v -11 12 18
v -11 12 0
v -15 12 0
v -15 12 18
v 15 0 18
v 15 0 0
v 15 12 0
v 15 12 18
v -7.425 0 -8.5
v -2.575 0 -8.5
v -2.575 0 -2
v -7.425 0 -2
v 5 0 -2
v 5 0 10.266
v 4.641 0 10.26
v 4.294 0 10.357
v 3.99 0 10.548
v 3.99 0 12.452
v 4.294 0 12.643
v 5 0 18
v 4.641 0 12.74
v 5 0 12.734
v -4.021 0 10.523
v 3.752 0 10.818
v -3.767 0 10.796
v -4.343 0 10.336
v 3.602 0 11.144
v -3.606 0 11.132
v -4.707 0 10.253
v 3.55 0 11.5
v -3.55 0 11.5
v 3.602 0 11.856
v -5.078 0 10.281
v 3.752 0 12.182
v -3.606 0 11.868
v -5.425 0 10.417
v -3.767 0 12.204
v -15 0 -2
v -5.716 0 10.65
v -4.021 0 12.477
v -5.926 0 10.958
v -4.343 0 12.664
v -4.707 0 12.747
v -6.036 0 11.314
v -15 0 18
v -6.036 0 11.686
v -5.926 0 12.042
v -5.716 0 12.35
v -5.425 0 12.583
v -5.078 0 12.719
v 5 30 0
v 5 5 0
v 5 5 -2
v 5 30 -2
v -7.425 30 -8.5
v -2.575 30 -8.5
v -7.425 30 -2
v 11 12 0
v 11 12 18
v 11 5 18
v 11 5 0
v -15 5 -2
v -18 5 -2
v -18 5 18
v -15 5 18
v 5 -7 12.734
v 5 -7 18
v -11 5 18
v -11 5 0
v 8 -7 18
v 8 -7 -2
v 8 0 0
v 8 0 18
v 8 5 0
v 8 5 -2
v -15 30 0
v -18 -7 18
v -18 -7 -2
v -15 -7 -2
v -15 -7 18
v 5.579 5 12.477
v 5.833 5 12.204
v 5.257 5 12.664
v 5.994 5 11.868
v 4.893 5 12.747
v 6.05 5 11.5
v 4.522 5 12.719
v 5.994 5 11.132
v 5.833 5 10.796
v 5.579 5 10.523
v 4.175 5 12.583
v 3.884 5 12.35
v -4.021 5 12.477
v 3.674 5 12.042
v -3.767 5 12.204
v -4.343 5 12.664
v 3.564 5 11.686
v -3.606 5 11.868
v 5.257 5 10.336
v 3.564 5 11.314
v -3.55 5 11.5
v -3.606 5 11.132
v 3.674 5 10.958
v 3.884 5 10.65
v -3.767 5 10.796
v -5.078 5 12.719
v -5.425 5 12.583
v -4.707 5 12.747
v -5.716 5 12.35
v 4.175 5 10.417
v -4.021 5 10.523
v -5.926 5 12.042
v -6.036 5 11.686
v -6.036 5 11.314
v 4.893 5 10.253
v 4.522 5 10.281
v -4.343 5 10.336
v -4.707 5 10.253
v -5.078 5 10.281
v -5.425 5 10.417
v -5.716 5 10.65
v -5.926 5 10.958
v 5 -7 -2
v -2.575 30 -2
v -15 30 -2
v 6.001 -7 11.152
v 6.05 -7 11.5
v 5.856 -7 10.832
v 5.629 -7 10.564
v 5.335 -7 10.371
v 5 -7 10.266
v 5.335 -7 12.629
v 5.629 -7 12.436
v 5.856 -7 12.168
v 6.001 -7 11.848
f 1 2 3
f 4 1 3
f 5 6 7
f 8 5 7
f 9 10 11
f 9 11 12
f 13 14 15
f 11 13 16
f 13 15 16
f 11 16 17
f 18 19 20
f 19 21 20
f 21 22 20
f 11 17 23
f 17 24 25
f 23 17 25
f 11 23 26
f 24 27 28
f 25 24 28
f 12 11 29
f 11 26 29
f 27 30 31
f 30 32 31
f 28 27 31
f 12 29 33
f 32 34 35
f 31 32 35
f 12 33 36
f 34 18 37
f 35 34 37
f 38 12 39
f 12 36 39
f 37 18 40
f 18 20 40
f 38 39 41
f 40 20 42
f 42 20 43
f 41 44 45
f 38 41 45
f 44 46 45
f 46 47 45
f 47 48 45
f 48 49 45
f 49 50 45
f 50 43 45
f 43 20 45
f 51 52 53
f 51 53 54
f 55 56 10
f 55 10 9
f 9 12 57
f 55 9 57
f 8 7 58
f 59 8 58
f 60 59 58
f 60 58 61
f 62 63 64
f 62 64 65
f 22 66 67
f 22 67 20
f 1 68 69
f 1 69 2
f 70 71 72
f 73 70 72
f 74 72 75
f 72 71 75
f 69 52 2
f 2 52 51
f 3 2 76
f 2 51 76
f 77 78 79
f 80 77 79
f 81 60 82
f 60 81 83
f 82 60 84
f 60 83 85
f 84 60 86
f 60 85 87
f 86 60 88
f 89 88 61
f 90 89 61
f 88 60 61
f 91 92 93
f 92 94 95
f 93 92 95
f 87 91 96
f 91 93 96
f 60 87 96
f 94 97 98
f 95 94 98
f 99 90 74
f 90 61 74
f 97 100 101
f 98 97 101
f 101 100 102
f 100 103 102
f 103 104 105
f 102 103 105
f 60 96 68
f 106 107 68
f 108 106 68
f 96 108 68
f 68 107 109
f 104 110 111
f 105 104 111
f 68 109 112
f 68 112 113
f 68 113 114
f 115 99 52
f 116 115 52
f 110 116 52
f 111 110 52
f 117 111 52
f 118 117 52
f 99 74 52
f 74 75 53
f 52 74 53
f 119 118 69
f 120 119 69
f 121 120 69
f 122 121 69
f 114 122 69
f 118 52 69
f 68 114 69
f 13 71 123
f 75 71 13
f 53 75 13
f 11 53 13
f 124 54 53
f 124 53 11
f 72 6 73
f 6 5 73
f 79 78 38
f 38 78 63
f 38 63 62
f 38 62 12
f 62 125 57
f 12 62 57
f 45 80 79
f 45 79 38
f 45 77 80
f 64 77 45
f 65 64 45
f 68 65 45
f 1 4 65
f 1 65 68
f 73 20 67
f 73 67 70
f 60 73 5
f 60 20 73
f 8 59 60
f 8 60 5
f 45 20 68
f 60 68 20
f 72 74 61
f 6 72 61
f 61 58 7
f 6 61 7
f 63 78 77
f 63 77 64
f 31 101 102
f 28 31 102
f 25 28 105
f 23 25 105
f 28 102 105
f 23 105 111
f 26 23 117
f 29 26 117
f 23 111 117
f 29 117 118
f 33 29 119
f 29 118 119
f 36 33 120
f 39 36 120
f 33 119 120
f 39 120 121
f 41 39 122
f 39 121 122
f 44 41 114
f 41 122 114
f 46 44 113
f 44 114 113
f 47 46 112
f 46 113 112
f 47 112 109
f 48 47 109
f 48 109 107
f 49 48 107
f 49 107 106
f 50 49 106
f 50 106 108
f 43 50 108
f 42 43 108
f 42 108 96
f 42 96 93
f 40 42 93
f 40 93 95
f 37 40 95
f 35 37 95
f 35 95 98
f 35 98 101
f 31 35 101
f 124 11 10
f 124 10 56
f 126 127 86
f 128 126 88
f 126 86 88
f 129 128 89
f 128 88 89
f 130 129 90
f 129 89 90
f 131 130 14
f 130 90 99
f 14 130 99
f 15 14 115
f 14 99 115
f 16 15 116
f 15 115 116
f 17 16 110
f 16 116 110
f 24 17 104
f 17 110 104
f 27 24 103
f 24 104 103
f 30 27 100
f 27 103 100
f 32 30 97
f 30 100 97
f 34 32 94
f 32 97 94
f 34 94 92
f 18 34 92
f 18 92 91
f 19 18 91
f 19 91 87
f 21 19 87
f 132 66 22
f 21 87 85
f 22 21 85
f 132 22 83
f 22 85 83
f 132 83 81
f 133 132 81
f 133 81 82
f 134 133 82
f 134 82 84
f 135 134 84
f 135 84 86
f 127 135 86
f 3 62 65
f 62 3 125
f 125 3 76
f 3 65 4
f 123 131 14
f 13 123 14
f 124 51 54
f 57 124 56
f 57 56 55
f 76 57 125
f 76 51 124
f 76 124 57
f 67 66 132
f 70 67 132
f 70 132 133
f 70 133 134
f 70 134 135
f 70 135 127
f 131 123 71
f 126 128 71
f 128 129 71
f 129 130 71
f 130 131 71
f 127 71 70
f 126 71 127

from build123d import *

# Parameters (mm, degrees)
EXTRUDE_1_DEPTH     = 18
SKETCH_3_W          = 20
SKETCH_3_H          = 30
EXTRUDE_2_DEPTH     = 2
SKETCH_4_W          = 4.85
SKETCH_4_H          = 30
EXTRUDE_3_DEPTH     = 6.5
EXTRUDE_START       = -20
SKETCH_5_W          = 3
SKETCH_5_H          = 12
EXTRUDE_4_DEPTH     = 20
SKETCH_2_R          = 1.25
CUT_EXTRUDE_1_DEPTH = 18


with BuildPart() as part:
    # 스케치1 → 보스-돌출1 (new body)
    with BuildSketch(Plane.XY):
        Polygon((-15, 12), (-15, 0), (15, 0), (15, 12), (11, 12), (11, 5), (-11, 5), (-11, 12), align=None)
    extrude(amount=EXTRUDE_1_DEPTH)

    # 스케치3 → 보스-돌출2 (add)
    with BuildSketch(Plane(origin=(0, 0, 0), x_dir=(-1, 0, 0), z_dir=(0, 0, -1))):
        with Locations((5, 15)):
            Rectangle(SKETCH_3_W, SKETCH_3_H)
    extrude(amount=EXTRUDE_2_DEPTH)

    # 스케치4 → 보스-돌출3 (add)
    with BuildSketch(Plane(origin=(0, 0, -2), x_dir=(-1, 0, 0), z_dir=(0, 0, -1))):
        with Locations((5, 15)):
            Rectangle(SKETCH_4_W, SKETCH_4_H)
    extrude(amount=EXTRUDE_3_DEPTH)

    # 스케치5 → 보스-돌출4 (add)
    with BuildSketch(Plane.XY.offset(18).offset(EXTRUDE_START)):
        with Locations((-16.5, -1)):
            Rectangle(SKETCH_5_W, SKETCH_5_H)
        with Locations((6.5, -1)):
            Rectangle(SKETCH_5_W, SKETCH_5_H)
    extrude(amount=EXTRUDE_4_DEPTH)

    # 스케치2 → 컷-돌출1 (cut)
    with BuildSketch(Plane(origin=(0, 5, 0), x_dir=(1, 0, 0), z_dir=(0, 1, 0))):
        with Locations((-4.8, -11.5)):
            Circle(SKETCH_2_R)
        with Locations((4.8, -11.5)):
            Circle(SKETCH_2_R)
    extrude(amount=-CUT_EXTRUDE_1_DEPTH, mode=Mode.SUBTRACT)


solid = part.part
